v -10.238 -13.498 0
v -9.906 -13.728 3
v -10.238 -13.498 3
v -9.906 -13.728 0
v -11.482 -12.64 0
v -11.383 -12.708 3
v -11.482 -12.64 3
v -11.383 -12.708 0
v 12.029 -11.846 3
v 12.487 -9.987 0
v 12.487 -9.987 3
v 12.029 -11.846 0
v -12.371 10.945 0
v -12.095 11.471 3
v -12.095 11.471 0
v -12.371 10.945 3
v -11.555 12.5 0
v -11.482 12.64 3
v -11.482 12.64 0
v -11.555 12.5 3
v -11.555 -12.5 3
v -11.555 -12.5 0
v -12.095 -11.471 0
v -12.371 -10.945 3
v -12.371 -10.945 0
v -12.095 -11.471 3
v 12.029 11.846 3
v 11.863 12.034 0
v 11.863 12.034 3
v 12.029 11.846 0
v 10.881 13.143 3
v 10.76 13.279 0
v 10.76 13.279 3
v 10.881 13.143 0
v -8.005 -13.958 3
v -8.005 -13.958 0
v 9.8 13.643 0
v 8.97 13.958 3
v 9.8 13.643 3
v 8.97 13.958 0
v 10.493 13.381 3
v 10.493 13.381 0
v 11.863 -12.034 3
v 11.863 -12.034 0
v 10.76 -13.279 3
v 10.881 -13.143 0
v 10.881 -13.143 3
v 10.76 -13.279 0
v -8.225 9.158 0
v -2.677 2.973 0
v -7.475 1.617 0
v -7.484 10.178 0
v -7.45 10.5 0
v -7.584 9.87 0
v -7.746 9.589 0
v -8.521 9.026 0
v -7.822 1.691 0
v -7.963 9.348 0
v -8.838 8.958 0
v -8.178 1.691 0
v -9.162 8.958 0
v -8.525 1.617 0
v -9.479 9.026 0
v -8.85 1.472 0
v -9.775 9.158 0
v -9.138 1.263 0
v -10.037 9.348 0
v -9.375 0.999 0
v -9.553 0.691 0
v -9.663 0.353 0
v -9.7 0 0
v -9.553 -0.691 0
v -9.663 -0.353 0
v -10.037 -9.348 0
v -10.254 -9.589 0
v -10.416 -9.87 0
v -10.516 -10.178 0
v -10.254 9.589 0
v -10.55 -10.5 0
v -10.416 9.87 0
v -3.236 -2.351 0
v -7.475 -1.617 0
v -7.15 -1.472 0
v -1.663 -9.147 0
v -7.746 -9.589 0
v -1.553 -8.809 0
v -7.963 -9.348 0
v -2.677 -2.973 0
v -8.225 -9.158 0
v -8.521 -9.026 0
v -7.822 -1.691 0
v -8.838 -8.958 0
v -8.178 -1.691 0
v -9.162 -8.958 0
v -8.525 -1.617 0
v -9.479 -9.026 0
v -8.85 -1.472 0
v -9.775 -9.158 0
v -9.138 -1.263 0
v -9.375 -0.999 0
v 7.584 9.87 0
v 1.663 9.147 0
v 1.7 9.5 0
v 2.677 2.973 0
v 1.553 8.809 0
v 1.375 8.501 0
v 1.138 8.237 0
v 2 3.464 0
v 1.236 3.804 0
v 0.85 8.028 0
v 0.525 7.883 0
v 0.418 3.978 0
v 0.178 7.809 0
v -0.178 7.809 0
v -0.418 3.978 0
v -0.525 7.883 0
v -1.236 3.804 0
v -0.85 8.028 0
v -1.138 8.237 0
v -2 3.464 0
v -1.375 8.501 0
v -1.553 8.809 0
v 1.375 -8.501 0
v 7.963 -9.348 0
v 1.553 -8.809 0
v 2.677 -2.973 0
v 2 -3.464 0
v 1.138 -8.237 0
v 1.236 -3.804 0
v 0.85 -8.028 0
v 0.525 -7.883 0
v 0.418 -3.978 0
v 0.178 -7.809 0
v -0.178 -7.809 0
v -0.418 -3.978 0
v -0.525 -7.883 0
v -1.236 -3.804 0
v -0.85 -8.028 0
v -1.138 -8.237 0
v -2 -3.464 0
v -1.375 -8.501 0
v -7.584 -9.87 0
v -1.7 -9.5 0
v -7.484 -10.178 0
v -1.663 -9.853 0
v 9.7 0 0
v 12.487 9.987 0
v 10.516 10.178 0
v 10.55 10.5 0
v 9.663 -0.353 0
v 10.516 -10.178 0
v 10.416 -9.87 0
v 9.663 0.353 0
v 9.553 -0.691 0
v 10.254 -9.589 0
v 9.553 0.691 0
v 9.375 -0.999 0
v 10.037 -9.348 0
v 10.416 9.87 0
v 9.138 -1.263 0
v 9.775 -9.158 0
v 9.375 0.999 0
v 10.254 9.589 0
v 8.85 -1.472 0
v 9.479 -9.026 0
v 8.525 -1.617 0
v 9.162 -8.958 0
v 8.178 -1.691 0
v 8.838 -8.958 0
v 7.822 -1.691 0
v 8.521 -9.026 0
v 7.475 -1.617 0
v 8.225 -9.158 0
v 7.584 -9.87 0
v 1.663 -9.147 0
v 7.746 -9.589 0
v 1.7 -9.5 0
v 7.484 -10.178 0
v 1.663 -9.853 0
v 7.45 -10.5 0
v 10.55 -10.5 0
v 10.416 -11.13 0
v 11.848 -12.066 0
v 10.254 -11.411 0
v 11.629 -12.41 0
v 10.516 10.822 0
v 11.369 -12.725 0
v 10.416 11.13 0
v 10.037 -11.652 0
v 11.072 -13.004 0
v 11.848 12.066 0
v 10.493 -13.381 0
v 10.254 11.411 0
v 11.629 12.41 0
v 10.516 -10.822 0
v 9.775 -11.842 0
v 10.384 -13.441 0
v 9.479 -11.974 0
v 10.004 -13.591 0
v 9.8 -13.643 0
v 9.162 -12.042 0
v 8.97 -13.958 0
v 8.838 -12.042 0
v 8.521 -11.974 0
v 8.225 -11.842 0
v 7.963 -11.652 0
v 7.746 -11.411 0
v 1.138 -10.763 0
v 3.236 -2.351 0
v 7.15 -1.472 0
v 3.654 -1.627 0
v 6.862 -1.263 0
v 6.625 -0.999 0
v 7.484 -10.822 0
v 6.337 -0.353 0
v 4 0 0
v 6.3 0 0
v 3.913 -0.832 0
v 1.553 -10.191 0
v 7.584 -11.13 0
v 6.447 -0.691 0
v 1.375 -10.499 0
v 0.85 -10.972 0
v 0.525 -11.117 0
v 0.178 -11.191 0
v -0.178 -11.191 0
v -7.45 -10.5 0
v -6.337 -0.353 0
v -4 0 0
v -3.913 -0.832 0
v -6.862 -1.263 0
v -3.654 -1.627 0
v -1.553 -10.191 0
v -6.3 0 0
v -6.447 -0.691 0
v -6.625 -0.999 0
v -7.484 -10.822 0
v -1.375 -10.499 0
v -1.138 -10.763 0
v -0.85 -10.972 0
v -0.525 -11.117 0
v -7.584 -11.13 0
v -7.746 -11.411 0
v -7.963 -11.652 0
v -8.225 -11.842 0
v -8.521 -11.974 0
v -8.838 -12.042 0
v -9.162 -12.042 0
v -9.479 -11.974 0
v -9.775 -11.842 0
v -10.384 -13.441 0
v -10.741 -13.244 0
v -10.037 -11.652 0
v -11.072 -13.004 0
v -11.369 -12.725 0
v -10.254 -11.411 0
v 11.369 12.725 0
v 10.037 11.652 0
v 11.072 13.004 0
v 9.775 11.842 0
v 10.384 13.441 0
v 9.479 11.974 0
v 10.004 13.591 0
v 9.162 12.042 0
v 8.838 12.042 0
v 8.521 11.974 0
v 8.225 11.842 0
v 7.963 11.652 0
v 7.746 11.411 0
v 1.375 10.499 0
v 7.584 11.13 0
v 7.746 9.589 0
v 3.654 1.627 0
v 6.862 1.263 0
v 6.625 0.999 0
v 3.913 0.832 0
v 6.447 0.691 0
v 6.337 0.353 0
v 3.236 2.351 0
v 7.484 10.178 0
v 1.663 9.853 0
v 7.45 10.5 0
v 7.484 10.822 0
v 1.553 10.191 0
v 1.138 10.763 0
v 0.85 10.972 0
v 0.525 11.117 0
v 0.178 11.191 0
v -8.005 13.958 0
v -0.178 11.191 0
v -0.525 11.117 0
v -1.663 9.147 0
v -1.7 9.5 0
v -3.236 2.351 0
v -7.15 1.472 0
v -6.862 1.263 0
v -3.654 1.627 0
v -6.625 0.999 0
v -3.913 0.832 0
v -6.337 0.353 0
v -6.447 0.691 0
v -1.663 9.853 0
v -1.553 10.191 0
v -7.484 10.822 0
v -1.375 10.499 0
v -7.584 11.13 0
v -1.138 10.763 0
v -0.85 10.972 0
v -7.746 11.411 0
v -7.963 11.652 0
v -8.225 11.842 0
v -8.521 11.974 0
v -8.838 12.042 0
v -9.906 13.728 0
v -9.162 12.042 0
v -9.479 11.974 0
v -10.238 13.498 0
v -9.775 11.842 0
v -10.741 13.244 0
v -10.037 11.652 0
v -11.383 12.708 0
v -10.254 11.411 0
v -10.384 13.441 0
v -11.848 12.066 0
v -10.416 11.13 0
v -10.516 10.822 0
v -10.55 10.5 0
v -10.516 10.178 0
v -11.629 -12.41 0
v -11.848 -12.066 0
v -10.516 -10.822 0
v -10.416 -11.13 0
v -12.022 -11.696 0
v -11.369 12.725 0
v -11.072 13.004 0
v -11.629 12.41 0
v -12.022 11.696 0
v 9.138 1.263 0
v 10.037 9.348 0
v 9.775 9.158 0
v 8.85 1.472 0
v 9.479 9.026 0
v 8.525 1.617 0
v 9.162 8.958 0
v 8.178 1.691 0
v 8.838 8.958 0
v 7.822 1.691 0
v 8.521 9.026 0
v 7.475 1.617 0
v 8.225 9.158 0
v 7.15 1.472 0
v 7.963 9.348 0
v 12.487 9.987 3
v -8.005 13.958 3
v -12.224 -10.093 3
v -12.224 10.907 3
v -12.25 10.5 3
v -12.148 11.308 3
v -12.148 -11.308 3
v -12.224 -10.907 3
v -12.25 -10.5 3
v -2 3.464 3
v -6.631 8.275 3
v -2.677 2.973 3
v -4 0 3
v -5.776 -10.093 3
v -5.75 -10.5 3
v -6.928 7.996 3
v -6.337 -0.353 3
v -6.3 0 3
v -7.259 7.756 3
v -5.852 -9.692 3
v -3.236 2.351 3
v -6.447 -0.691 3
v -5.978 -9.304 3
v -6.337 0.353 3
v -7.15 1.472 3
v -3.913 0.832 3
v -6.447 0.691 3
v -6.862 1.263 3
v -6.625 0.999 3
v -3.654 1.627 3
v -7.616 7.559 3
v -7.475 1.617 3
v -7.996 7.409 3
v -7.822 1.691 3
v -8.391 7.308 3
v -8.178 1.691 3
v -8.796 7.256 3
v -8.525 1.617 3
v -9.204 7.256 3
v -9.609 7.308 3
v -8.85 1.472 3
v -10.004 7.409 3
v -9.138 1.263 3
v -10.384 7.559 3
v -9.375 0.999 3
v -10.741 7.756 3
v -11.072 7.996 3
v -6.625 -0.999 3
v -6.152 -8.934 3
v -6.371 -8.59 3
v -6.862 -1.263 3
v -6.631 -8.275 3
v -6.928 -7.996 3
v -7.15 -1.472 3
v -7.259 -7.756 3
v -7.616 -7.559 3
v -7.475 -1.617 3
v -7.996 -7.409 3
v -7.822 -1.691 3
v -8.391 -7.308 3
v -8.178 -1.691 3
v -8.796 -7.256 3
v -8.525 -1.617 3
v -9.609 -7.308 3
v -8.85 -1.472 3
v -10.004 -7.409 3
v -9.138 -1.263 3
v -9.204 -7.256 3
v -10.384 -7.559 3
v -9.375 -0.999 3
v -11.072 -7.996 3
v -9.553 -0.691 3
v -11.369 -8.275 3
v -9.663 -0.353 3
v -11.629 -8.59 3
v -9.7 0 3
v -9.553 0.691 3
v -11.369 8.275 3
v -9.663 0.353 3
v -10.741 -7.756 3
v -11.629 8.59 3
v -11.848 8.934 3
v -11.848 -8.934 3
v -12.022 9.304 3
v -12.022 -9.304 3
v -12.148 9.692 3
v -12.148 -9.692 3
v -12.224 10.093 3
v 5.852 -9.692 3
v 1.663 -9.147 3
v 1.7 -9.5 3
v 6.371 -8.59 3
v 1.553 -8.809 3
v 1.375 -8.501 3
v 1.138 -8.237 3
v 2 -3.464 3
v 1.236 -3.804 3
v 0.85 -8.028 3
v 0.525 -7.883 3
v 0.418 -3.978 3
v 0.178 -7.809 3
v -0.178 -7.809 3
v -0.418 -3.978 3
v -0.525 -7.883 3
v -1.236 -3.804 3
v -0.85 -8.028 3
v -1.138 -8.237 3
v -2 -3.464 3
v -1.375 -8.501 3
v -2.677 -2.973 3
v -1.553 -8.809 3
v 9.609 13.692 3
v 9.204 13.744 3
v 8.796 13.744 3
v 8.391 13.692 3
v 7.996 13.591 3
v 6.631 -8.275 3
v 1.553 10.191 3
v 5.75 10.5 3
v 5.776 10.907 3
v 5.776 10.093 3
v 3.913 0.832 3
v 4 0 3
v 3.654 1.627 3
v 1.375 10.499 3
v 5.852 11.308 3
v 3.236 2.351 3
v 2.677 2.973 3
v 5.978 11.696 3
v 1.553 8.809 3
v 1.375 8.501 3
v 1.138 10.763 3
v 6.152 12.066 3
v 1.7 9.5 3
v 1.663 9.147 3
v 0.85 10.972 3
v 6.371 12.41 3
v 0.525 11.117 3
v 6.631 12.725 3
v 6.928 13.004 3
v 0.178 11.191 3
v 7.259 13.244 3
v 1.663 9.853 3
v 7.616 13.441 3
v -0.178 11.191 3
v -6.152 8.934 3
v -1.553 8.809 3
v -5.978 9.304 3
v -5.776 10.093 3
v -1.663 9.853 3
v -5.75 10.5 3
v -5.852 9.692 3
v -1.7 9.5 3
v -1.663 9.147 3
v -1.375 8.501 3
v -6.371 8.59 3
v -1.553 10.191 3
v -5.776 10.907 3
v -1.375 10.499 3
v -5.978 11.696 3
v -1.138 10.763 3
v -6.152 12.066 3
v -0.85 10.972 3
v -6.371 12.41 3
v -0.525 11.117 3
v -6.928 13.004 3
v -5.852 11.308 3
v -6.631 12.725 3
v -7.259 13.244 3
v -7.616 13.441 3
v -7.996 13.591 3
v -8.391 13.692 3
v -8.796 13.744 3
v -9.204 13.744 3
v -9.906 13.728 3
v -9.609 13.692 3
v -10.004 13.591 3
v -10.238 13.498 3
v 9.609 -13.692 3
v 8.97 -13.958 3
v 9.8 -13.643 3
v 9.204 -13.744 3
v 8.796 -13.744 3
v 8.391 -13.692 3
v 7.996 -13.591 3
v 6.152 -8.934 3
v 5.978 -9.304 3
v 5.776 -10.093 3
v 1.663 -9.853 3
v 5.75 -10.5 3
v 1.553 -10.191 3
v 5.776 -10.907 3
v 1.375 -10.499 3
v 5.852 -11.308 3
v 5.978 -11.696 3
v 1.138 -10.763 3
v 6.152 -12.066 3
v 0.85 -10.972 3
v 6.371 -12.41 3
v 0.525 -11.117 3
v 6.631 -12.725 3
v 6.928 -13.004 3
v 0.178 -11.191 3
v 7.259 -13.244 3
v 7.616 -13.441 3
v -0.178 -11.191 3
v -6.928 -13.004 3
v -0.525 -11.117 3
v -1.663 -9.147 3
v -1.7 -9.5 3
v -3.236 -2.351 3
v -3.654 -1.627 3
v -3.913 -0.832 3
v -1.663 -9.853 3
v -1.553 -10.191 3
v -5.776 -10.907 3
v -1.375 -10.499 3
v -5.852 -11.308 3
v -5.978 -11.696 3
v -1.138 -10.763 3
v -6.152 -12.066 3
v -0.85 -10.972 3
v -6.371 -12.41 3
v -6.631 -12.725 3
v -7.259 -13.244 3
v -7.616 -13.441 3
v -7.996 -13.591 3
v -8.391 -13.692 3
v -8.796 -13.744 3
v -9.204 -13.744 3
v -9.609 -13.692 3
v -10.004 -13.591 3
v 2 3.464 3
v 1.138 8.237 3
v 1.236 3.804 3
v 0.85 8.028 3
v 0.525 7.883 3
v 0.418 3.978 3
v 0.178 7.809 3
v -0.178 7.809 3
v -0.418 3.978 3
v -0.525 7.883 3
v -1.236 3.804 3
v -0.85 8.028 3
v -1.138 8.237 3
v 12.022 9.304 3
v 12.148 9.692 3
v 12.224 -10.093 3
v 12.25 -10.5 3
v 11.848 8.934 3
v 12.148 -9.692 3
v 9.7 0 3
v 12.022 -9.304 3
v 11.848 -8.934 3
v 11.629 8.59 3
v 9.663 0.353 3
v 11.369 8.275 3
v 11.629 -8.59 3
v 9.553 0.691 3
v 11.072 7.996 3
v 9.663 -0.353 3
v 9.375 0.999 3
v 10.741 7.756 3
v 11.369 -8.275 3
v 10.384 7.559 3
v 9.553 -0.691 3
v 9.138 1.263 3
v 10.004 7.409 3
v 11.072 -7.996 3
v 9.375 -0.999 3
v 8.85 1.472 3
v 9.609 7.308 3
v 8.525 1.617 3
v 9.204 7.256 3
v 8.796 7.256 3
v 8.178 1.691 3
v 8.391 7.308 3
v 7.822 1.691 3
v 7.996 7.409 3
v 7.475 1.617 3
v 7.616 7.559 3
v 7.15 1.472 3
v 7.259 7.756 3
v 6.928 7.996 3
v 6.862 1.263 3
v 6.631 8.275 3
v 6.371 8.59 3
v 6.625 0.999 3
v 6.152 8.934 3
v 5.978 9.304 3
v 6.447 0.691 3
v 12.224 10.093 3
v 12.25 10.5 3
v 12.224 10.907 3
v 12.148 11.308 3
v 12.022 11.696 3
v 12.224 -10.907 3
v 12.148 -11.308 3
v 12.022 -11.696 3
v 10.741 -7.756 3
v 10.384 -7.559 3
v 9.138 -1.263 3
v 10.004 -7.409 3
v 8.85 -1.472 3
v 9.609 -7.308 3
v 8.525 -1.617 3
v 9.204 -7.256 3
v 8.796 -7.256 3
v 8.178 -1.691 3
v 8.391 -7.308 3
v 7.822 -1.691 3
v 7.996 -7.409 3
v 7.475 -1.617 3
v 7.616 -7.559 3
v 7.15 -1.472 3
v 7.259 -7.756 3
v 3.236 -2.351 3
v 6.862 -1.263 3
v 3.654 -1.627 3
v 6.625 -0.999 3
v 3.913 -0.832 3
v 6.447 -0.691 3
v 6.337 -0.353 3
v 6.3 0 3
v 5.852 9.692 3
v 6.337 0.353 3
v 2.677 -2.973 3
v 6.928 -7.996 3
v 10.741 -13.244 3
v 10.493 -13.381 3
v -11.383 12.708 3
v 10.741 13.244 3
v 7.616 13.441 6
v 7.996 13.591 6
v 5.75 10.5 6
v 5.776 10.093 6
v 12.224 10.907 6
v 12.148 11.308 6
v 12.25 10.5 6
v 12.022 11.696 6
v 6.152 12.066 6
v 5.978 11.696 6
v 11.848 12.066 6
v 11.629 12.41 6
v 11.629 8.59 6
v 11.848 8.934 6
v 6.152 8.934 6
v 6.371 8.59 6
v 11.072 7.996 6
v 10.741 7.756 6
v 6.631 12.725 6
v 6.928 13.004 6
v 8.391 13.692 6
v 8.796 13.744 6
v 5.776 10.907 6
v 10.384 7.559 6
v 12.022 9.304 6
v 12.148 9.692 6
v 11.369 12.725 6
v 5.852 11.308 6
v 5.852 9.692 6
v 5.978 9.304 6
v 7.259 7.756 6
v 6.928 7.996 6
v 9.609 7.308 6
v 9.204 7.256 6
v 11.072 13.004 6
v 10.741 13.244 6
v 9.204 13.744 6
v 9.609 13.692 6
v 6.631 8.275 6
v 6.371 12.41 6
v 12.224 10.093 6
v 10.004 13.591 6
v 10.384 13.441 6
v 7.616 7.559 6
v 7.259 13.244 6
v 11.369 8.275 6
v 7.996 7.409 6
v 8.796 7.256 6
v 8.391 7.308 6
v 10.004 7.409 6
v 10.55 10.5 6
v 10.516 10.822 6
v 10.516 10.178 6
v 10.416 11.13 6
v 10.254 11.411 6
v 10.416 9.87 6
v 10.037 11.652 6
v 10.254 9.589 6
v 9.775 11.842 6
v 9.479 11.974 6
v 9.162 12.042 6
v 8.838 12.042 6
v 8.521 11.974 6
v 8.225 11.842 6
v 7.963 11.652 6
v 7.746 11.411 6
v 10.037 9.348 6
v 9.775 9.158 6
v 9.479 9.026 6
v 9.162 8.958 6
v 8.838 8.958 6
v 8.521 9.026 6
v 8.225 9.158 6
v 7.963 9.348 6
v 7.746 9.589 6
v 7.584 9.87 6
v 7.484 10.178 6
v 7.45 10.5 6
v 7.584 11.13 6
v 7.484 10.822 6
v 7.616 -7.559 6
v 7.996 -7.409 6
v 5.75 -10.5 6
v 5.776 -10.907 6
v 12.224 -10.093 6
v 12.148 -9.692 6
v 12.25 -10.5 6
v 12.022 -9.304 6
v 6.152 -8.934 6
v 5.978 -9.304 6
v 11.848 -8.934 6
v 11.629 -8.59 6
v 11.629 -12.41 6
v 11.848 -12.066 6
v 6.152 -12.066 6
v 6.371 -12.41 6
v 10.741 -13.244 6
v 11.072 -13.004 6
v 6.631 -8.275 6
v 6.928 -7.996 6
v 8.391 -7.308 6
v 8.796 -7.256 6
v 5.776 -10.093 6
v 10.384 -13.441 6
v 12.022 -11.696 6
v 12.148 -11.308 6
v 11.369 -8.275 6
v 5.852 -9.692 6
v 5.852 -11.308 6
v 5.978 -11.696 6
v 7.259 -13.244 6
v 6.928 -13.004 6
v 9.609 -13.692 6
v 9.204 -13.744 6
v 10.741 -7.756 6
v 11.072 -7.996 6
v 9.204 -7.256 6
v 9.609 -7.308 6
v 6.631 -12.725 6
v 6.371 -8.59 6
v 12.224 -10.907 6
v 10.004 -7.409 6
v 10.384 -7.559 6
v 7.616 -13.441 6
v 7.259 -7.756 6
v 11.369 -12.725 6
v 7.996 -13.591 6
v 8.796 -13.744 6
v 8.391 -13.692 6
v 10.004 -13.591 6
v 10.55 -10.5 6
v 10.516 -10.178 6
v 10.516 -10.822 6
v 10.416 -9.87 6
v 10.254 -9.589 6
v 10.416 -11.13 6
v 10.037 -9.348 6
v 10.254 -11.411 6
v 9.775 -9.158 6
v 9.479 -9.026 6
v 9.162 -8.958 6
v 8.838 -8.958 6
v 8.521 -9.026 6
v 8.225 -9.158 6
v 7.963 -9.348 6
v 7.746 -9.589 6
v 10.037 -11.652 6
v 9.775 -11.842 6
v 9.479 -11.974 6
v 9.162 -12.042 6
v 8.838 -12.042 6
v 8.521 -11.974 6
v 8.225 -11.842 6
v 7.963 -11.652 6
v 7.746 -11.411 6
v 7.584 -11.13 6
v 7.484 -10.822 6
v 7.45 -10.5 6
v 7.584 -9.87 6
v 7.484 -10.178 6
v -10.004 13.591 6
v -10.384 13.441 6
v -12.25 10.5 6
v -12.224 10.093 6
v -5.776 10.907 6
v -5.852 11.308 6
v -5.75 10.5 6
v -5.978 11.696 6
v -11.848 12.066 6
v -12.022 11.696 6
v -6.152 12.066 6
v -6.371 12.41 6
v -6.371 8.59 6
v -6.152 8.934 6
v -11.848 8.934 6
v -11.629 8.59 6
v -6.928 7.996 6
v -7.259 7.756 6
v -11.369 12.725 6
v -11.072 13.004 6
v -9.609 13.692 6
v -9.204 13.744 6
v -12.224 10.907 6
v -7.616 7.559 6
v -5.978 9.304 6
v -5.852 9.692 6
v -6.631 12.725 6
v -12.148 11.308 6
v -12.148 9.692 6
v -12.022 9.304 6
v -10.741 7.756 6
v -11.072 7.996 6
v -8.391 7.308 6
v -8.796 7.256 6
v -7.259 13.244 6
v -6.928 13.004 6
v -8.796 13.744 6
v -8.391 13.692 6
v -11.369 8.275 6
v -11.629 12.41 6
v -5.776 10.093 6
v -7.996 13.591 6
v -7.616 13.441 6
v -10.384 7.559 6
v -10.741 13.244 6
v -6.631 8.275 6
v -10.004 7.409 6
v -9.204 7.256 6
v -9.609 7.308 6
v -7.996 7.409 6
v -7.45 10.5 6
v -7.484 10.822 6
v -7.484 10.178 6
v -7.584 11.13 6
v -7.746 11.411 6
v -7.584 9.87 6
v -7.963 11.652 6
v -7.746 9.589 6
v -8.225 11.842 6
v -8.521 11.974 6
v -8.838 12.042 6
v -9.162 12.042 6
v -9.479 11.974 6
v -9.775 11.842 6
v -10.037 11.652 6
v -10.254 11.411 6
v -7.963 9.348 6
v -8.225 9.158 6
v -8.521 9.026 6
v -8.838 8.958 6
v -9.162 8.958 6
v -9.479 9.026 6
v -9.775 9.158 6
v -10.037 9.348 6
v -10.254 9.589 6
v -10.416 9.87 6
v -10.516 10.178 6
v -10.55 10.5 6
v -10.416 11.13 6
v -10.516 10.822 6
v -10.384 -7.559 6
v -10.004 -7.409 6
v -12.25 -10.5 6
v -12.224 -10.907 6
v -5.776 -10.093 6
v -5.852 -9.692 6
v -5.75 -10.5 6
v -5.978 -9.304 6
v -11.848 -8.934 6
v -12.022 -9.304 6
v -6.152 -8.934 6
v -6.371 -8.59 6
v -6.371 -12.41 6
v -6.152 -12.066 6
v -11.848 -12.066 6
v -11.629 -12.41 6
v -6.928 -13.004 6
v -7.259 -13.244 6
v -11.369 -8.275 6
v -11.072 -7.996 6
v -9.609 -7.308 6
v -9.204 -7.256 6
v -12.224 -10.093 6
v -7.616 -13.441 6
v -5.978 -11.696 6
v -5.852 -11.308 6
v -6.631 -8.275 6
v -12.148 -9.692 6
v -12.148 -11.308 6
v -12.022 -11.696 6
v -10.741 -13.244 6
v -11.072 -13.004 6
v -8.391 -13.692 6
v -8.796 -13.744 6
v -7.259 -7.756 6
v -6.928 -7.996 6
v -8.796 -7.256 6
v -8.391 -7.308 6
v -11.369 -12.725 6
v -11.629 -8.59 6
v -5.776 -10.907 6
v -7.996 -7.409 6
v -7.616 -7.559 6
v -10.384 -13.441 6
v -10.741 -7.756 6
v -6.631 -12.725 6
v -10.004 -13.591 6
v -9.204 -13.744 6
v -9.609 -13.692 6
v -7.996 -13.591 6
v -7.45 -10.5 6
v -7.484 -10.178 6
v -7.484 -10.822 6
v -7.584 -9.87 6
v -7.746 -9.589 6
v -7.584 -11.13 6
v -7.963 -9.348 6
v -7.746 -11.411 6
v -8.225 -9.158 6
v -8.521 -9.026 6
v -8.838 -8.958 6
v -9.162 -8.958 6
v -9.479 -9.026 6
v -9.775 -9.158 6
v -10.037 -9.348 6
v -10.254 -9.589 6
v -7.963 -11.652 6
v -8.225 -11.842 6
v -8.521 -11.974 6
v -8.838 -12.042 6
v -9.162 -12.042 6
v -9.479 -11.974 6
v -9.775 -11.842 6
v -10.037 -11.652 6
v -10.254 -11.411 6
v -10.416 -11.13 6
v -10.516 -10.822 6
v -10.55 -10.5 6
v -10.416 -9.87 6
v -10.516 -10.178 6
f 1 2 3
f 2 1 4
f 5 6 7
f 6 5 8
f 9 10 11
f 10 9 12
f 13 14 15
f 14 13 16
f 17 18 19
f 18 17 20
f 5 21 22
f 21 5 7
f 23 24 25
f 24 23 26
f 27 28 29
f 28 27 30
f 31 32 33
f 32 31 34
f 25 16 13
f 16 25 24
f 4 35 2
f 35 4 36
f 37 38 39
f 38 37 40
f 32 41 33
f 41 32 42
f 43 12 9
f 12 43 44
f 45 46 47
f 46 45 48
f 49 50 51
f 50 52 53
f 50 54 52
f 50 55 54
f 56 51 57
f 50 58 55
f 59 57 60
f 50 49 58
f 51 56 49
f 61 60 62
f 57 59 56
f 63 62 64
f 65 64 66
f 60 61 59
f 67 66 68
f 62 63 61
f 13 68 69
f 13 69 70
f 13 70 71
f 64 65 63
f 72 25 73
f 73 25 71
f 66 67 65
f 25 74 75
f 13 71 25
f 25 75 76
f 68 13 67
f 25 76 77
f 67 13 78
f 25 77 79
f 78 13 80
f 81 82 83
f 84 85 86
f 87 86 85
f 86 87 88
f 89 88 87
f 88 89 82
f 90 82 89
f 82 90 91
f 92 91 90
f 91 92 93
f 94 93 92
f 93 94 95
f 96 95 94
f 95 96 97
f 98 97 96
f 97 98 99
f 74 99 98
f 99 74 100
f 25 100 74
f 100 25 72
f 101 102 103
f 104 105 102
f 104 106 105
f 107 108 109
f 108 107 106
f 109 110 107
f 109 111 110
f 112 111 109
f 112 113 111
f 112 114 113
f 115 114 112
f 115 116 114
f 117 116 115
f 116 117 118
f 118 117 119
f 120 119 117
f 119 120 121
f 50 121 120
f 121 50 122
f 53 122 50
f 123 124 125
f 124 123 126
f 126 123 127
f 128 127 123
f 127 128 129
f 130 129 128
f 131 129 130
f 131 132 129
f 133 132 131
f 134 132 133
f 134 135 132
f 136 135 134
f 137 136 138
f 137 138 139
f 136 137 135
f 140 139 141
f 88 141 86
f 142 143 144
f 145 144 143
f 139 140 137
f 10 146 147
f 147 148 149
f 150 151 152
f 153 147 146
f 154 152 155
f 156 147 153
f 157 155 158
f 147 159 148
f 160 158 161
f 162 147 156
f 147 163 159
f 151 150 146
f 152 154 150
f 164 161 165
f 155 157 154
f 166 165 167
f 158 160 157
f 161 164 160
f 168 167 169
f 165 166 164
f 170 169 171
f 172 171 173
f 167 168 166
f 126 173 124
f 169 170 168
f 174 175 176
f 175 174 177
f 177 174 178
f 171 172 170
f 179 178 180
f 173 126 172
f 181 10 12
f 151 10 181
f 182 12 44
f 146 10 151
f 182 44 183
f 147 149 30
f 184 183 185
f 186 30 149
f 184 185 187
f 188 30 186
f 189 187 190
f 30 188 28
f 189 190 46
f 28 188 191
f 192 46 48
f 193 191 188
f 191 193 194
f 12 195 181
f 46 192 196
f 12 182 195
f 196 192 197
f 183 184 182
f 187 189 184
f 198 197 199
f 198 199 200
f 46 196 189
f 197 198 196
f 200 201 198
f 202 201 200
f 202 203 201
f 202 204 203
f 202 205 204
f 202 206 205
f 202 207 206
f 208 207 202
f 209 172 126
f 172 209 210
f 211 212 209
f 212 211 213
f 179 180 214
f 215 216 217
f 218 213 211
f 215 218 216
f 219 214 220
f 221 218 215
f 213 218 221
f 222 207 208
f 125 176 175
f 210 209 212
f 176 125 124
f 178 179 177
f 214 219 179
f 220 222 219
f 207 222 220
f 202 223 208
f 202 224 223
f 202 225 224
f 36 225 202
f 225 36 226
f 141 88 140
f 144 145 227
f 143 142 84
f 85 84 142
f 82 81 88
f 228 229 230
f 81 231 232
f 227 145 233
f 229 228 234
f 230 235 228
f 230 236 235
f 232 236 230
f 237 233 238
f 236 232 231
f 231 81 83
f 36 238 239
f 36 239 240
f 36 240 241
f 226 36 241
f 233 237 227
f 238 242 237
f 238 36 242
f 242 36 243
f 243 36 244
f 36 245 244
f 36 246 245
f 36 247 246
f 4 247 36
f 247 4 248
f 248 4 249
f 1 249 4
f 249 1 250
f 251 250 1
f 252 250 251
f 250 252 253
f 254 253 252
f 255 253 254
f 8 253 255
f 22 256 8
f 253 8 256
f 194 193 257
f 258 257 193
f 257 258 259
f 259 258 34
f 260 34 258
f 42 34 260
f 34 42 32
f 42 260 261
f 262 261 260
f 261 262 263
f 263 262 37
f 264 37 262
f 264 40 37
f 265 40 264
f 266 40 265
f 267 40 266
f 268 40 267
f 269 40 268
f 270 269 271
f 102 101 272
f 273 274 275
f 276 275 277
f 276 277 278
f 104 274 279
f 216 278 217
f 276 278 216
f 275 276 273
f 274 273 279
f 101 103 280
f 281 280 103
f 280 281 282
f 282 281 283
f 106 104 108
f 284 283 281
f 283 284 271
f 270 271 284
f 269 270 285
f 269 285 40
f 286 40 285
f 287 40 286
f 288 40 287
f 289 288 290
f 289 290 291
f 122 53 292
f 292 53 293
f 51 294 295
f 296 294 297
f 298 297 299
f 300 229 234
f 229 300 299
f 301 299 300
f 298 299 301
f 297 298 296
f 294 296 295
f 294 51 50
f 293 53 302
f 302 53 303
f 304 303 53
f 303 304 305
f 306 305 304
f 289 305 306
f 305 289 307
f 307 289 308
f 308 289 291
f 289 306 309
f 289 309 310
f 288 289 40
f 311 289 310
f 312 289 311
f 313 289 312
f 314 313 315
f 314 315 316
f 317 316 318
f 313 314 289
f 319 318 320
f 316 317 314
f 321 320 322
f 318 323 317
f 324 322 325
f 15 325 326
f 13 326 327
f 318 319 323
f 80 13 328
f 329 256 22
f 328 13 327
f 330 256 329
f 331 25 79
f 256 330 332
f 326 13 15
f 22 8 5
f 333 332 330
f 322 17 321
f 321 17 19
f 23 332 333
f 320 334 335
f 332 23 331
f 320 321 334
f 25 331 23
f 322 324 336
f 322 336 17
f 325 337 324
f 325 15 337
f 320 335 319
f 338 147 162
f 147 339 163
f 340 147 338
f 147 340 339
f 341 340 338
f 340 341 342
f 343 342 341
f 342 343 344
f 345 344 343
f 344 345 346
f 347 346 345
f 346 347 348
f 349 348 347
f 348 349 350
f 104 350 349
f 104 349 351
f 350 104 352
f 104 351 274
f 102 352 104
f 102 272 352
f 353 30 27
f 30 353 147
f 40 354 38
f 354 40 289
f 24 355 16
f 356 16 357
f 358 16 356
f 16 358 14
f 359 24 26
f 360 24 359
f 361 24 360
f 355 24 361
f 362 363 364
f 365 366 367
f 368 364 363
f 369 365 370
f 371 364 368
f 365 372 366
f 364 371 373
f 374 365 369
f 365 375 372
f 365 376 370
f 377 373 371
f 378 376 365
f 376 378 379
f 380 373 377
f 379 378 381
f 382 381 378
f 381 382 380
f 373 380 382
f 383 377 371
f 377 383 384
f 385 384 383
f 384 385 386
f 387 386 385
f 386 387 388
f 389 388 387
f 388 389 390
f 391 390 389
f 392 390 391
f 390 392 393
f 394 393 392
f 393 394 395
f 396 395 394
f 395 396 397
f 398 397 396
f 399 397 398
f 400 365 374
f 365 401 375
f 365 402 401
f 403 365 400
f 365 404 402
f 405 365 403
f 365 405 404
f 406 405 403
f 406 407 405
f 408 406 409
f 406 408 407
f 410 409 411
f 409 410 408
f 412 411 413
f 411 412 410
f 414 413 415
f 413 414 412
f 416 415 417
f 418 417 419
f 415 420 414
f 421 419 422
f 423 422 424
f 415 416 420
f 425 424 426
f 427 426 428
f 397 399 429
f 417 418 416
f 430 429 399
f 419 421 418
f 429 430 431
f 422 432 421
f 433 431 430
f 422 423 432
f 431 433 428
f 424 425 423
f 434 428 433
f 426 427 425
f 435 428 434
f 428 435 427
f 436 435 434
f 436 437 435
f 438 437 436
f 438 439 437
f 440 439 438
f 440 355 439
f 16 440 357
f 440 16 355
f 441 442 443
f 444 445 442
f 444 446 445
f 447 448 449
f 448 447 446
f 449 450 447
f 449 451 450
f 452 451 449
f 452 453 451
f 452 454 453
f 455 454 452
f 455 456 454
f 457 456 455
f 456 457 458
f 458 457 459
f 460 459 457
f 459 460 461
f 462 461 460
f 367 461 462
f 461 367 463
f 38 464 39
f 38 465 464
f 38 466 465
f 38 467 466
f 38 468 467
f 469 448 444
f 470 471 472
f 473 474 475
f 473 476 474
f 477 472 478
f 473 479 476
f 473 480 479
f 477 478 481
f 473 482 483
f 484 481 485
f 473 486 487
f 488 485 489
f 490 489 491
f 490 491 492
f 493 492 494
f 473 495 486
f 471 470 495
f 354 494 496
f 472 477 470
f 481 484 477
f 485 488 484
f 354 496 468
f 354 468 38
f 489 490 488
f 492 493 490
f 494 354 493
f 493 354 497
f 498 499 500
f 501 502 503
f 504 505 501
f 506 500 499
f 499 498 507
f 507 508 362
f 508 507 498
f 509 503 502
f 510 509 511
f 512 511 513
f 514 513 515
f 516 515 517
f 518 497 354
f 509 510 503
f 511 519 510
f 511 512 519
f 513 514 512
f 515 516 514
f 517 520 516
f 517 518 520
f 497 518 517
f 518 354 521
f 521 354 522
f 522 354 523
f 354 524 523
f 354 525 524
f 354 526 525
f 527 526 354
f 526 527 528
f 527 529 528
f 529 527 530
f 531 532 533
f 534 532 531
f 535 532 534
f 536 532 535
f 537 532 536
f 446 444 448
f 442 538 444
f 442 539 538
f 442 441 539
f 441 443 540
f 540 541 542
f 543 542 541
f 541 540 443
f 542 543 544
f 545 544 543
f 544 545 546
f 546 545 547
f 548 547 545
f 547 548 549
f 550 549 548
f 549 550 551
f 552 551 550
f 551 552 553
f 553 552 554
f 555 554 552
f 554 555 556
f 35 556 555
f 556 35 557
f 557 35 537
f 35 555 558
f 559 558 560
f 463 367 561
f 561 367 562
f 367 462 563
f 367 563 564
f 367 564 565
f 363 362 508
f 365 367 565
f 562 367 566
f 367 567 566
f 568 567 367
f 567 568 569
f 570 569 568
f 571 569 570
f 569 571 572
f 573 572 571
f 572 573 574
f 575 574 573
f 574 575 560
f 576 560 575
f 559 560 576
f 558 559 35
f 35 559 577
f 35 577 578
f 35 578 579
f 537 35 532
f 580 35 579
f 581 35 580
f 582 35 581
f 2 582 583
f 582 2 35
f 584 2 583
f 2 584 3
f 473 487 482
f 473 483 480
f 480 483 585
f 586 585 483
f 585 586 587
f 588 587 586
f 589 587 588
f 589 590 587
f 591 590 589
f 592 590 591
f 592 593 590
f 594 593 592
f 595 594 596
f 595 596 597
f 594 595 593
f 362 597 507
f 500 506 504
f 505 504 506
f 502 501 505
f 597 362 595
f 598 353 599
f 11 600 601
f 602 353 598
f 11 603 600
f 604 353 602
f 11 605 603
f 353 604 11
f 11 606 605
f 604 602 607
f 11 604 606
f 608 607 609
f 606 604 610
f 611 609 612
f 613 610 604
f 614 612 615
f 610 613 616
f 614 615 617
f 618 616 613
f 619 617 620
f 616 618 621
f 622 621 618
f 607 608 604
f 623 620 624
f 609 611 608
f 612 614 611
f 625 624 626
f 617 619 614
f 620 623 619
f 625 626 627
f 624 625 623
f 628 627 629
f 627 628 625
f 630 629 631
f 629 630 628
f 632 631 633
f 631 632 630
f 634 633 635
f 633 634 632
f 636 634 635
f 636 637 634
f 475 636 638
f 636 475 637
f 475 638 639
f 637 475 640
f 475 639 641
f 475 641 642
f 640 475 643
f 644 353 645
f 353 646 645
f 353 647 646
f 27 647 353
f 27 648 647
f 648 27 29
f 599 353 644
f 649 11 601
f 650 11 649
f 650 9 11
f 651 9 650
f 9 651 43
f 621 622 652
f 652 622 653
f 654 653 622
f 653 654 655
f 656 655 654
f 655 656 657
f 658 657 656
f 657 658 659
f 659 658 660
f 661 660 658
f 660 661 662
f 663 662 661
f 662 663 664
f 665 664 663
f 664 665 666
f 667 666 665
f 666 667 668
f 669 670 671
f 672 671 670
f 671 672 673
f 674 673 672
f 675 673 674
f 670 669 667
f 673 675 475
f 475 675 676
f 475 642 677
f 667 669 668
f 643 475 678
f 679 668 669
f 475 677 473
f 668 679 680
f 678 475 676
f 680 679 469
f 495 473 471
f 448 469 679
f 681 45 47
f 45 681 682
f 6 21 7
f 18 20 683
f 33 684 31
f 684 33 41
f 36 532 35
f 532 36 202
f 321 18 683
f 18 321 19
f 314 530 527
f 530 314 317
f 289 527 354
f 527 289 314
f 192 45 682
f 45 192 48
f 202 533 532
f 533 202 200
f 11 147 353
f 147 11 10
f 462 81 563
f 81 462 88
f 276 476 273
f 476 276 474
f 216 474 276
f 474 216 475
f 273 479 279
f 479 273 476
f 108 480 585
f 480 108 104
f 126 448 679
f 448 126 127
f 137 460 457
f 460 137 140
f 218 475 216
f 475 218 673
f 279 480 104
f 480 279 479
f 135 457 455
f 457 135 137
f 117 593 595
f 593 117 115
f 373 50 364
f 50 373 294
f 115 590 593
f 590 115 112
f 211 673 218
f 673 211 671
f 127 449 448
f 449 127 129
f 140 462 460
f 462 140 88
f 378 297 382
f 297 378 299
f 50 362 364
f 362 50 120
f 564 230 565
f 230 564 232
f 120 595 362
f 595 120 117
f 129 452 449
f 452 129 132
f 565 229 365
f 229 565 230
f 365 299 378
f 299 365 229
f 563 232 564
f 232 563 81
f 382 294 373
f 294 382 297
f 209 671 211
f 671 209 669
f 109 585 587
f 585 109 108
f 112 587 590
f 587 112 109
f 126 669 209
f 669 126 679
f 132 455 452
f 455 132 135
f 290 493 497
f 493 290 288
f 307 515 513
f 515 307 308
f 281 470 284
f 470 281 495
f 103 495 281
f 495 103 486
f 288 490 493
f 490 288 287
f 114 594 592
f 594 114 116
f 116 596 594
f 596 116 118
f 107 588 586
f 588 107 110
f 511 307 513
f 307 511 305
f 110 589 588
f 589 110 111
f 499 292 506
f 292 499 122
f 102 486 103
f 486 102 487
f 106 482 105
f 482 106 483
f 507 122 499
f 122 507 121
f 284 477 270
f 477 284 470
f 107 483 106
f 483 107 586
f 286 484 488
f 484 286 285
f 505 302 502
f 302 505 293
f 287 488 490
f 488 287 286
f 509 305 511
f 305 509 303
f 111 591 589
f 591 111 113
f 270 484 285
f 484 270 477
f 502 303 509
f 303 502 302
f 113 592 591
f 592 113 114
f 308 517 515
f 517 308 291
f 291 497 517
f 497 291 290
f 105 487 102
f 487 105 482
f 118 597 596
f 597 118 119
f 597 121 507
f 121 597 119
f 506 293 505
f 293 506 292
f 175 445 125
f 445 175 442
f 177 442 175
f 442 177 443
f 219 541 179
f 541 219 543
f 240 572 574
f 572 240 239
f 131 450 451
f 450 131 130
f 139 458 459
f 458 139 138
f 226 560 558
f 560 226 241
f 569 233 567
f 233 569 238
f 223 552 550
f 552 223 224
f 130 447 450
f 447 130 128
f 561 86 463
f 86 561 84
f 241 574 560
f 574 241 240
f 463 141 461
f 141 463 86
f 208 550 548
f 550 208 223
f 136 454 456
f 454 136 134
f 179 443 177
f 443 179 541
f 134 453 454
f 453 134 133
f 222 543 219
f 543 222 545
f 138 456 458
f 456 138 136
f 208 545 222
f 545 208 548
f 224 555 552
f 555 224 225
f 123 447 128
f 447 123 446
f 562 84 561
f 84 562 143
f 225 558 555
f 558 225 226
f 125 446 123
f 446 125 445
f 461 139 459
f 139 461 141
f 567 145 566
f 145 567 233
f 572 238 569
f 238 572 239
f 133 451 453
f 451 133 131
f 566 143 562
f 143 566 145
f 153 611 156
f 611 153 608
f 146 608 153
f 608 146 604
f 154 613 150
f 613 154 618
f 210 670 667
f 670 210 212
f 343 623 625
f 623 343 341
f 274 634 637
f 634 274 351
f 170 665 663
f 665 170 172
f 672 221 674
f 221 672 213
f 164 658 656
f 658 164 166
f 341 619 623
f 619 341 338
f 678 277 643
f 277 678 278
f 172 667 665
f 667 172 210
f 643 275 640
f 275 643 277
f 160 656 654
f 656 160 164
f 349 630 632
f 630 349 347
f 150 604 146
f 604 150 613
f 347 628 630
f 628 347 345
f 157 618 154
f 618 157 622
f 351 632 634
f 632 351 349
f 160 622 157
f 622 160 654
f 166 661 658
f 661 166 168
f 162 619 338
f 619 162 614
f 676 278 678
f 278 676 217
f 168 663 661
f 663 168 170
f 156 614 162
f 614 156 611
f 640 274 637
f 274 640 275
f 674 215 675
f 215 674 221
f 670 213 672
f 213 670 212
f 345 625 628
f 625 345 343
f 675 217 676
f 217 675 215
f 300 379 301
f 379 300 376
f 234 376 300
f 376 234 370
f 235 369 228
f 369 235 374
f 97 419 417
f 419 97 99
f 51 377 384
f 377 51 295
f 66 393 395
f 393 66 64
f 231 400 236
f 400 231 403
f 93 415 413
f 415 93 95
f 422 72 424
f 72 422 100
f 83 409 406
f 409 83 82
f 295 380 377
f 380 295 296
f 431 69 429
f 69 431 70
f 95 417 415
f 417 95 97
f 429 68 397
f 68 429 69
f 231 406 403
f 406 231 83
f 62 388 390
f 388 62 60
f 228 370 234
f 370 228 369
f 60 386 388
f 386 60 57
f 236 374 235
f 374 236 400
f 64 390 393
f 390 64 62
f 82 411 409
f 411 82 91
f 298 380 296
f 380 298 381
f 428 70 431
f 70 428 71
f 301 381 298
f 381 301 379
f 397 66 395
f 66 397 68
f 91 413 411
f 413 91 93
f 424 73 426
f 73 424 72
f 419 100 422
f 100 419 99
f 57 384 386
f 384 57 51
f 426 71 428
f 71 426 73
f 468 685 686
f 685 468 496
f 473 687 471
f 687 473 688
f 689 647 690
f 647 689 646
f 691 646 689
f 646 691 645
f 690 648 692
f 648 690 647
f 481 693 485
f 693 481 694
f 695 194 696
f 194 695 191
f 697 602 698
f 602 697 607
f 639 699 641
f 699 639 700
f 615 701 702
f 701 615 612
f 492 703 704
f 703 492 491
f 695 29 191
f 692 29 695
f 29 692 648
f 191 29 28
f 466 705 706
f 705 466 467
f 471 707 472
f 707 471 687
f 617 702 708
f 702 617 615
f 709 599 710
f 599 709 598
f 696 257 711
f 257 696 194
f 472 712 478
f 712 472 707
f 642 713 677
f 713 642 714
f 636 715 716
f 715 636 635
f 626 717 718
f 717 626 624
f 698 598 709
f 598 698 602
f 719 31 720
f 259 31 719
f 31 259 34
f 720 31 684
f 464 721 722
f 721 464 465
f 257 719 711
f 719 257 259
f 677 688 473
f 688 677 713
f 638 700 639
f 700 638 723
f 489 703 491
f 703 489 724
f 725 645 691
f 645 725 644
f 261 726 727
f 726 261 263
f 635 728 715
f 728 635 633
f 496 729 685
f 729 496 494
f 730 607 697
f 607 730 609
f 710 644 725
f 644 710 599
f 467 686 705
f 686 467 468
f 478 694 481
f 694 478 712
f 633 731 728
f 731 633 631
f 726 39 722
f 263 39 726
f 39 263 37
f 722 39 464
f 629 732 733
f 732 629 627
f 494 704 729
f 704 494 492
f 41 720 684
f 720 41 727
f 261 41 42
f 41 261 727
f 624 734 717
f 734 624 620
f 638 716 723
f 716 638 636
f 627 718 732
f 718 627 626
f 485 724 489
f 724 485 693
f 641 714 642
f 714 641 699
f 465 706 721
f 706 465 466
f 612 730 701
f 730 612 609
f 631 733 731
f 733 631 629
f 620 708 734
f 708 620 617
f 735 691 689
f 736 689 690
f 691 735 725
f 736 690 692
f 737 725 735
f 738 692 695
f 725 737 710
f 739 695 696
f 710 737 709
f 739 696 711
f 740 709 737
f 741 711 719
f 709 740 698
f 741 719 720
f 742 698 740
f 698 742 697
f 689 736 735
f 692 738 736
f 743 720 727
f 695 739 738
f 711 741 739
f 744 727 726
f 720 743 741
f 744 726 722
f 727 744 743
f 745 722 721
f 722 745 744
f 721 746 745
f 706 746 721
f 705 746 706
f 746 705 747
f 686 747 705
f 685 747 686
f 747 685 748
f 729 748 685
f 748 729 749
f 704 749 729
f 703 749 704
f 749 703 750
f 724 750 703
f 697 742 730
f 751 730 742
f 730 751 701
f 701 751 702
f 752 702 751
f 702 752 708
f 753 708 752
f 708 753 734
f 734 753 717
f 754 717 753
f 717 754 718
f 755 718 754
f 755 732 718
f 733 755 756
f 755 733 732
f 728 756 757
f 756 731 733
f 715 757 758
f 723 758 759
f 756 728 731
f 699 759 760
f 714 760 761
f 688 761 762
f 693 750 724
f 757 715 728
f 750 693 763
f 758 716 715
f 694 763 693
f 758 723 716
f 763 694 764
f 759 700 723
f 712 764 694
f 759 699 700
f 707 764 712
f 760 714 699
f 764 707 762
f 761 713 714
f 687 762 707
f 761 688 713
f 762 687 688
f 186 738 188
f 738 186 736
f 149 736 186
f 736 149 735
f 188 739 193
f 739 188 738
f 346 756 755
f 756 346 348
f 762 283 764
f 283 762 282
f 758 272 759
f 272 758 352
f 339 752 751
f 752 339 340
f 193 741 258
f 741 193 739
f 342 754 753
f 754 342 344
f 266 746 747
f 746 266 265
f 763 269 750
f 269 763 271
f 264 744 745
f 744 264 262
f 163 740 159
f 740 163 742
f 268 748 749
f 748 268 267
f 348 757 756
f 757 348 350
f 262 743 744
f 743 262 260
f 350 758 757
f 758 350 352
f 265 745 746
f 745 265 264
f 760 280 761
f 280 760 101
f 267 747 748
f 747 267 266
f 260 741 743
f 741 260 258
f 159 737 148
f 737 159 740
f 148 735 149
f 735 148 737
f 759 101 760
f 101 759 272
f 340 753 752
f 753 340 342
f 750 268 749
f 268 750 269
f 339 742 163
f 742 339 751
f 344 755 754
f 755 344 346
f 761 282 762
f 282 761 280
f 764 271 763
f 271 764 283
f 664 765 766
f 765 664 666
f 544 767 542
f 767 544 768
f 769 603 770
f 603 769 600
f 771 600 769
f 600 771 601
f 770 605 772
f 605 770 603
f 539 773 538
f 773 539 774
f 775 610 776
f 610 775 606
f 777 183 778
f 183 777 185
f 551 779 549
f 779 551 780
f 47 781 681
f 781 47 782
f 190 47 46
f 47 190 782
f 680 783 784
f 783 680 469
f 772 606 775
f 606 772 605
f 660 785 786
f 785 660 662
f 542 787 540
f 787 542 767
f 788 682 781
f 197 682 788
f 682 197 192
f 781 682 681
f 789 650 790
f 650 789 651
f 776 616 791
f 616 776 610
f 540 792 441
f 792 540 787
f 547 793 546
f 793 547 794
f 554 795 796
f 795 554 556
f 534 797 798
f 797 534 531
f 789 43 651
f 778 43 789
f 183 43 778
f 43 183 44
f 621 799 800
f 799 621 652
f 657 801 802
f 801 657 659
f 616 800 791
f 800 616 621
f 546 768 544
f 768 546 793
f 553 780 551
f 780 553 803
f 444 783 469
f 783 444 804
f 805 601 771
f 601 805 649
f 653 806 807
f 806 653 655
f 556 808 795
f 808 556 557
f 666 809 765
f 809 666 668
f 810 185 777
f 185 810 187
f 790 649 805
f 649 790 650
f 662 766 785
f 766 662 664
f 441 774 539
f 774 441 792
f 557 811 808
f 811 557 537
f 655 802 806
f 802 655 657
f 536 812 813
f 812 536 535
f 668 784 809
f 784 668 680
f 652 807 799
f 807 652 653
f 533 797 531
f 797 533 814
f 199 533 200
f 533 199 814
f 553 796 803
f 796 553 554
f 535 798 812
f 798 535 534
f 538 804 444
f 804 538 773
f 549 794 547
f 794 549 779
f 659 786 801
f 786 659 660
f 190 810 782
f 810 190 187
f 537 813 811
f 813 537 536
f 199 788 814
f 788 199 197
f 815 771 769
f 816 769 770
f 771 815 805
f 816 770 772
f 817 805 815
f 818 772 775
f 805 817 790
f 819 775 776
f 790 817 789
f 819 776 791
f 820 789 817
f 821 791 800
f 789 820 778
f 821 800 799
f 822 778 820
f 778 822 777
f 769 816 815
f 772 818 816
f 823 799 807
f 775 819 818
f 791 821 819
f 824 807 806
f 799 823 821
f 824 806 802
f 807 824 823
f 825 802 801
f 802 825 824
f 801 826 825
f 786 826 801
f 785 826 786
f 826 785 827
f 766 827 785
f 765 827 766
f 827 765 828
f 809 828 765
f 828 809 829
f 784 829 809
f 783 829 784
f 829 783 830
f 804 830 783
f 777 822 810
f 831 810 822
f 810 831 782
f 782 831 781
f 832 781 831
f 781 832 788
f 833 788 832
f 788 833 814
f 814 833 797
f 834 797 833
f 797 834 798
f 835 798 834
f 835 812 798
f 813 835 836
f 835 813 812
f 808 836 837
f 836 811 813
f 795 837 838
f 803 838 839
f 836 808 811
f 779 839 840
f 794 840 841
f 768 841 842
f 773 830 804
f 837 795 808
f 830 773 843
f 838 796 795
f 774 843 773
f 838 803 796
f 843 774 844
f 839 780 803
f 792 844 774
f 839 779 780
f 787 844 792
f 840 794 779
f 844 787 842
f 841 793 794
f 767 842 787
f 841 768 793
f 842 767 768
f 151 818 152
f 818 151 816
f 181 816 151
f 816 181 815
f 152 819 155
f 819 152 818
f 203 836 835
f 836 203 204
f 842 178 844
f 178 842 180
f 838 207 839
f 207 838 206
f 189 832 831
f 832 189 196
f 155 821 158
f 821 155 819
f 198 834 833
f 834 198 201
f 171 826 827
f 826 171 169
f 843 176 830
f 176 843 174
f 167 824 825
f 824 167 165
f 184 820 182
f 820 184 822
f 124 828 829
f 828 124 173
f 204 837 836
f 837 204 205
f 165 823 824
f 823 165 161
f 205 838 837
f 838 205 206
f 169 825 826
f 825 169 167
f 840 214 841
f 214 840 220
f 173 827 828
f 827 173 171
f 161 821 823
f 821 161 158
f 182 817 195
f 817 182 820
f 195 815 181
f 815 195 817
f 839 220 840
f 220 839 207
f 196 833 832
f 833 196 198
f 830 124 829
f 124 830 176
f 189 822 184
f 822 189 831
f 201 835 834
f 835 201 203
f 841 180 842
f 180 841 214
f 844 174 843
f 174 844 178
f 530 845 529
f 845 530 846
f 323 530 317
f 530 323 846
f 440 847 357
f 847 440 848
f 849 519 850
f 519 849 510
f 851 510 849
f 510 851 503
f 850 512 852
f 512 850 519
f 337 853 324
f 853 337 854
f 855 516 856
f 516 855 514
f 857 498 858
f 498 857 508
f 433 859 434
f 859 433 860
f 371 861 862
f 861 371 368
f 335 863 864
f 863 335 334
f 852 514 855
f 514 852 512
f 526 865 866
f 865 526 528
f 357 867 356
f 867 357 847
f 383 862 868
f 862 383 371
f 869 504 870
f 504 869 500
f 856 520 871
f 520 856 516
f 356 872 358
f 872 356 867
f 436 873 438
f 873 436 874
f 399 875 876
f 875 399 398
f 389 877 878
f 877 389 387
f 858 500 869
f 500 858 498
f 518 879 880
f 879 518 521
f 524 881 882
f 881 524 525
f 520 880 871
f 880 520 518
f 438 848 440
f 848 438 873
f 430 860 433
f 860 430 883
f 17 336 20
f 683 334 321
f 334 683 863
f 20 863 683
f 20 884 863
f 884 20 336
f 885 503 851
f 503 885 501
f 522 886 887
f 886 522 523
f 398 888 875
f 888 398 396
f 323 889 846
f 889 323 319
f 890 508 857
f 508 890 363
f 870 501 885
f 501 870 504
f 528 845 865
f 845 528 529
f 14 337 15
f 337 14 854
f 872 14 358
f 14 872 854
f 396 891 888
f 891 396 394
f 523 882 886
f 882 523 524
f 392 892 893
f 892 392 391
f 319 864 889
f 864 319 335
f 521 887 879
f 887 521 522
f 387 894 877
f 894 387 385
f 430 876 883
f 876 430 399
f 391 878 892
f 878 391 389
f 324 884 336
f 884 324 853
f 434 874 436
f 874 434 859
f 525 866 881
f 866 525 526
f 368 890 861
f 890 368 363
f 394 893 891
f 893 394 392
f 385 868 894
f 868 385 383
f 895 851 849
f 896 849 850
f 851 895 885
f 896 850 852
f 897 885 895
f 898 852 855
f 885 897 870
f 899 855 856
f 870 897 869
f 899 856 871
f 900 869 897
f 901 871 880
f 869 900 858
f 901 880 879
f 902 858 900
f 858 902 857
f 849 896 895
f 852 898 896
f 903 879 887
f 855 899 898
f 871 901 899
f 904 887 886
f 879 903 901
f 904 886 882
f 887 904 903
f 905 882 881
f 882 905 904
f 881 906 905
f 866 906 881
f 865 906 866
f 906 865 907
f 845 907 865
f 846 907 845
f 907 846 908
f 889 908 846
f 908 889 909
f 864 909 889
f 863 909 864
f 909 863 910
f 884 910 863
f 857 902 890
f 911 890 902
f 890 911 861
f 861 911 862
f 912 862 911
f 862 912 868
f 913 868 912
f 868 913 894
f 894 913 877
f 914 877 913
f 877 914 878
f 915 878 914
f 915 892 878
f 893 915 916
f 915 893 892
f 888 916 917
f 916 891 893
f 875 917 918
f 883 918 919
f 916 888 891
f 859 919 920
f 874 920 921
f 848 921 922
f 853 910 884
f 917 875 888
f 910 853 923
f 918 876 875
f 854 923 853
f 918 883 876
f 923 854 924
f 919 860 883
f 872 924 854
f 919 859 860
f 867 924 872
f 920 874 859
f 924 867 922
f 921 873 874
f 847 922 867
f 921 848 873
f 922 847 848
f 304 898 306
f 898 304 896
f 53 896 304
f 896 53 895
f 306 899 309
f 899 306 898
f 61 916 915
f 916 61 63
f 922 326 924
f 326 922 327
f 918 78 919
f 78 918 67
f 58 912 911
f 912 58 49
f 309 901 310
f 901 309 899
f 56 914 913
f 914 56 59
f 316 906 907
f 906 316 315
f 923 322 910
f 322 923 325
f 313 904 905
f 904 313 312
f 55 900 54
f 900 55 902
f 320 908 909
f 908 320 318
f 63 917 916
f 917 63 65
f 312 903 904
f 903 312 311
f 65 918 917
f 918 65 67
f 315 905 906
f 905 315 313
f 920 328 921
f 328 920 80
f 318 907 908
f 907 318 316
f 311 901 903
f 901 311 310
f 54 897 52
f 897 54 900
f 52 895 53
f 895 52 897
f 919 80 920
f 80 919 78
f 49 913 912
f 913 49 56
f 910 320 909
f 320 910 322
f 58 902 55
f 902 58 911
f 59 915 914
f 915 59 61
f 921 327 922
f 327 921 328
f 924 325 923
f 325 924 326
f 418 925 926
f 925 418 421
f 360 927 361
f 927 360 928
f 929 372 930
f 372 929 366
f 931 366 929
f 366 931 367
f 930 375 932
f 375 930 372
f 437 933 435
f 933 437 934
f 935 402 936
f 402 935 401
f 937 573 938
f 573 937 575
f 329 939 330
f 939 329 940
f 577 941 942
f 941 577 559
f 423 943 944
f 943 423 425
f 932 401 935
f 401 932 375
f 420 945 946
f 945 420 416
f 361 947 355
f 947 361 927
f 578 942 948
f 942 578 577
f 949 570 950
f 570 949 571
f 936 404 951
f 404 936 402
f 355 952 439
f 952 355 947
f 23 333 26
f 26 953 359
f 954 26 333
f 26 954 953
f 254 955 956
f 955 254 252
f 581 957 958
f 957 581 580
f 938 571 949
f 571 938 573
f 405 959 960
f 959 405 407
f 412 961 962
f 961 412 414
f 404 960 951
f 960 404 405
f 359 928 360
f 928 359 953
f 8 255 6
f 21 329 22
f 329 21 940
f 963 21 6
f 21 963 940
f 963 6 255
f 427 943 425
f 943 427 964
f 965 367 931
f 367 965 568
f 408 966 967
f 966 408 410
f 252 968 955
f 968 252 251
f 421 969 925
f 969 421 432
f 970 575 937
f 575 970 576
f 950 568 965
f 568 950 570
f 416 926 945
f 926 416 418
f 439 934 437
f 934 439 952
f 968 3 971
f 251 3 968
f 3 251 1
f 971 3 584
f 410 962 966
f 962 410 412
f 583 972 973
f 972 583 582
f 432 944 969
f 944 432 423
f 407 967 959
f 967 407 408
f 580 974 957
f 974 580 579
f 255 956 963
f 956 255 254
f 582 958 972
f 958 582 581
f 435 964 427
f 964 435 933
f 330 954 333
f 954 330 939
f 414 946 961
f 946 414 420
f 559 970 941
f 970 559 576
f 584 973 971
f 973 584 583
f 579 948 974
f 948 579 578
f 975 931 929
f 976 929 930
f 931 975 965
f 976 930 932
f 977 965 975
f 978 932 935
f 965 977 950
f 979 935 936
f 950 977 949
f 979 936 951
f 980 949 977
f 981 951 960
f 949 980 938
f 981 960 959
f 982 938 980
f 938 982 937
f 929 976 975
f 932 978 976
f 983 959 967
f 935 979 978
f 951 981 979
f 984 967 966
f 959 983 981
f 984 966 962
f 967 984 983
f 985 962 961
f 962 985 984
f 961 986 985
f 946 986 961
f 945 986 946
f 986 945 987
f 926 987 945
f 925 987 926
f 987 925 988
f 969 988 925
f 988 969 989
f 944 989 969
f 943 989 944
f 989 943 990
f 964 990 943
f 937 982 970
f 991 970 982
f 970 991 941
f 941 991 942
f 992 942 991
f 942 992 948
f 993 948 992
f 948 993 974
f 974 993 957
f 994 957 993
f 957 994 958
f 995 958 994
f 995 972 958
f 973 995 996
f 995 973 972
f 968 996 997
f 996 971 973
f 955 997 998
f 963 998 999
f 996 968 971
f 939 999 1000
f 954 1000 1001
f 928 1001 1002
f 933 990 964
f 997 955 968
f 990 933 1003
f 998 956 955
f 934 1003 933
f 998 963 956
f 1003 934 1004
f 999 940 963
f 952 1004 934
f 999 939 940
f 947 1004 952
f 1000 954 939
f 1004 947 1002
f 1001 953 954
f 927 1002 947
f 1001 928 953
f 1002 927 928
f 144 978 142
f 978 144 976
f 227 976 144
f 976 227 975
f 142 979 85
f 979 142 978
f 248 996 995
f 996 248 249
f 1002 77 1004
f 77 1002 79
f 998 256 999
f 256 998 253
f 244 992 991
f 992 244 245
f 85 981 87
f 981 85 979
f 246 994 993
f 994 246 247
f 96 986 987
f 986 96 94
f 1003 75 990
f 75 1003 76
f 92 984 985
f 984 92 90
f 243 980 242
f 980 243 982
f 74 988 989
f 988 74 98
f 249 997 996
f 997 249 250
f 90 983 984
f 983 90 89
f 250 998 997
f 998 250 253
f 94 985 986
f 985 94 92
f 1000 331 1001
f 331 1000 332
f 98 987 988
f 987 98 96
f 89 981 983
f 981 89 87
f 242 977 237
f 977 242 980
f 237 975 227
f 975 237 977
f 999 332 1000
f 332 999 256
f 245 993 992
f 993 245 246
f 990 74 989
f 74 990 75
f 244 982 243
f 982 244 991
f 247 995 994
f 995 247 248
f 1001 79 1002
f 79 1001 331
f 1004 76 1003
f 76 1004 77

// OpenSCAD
// file: dronePlates.scad
/**
 * dronePlates.scad
 * Plate library
 *
 * GNU GPL V3
 * @author: Victor Potenciano
 */

m3Rad = 3.4/2;
cornerR = 4;

/**
 *
 */
module helperDisk(diameter) {
	cylinder(r = diameter/2, h = 0.6, $fn=20);
}

/**
 *
 */
module roundedRect(size, radius) {
	x = size[0];
	y = size[1];
	z = size[2];

	linear_extrude(height=z)
	hull() {
	// place 4 circles in the corners, with the given radius
	translate([(-x/2)+(radius/2), (-y/2)+(radius/2), 0]){ circle(r=radius); }
	translate([(x/2)-(radius/2), (-y/2)+(radius/2), 0]){ circle(r=radius); }
	translate([(-x/2)+(radius/2), (y/2)-(radius/2), 0]){ circle(r=radius); }
	translate([(x/2)-(radius/2), (y/2)-(radius/2), 0]){ circle(r=radius); }
	}
}

/**
 * rounded rectangle triangle with corner at origin
 */
module roundedTriangle(size, radius) {
	x = size[0];
	y = size[1];
	z = size[2];

	linear_extrude(height=z)
	hull() {
	translate([radius, radius, 0]){ circle(r=radius); }
	translate([x-radius, radius, 0]){ circle(r=radius); }
	translate([radius, y-radius, 0]){ circle(r=radius); }
	}
}

/**
 *
 */
module roundRectPlate(w, l, plateThick=3) {
	difference(){
		roundedRect([l+m3Rad*1.75,w+m3Rad*1.75,plateThick], cornerR);
		translate([l/2, w/2, -0.5]) { cylinder(h = plateThick+1, r = m3Rad, $fn=30); }
		translate([-l/2, w/2, -0.5]) { cylinder(h = plateThick+1, r = m3Rad, $fn=30); }
		translate([l/2, -w/2, -0.5]) { cylinder(h = plateThick+1, r = m3Rad, $fn=30); }
		translate([-l/2, -w/2, -0.5]) { cylinder(h = plateThick+1, r = m3Rad, $fn=30); }
	}
}

/**
 *
 */
module crossSquarePlate(l, thick=3) {
	inDist = cornerR*2+4;
	trianL = sqrt((l*l)/2)-inDist;
	centerR = 4;

	difference(){
		roundRectPlate(l, l, thick);
		translate([0, centerR, -0.5]) { 
			rotate([0,0,45]){ roundedTriangle([trianL,trianL,thick+1], cornerR-2); }
		}
		translate([0, -centerR, -0.5]) { 
			rotate([0,0,225]){ roundedTriangle([trianL,trianL,thick+1], cornerR-2); }
		}
		translate([-centerR, 0, -0.5]) { 
			rotate([0,0,135]){ roundedTriangle([trianL,trianL,thick+1], cornerR-2); }
		}
		translate([centerR, 0, -0.5]) { 
			rotate([0,0,-45]){ roundedTriangle([trianL,trianL,thick+1], cornerR-2); }
		}
	}
}

/**
 *
 */
module hShapePlate(w, l, thick=4) {
	inDist = cornerR*2+1;

	difference(){
		roundRectPlate(w, l, thick);
		translate([0, w/4, -0.5]) { roundedRect([l-inDist,w/2-inDist,thick+1], cornerR-2); }
		translate([0, -w/4, -0.5]) { roundedRect([l-inDist,w/2-inDist,thick+1], cornerR-2); }
	}
}

/**
 *
 */
module motorCircleMount(inDia, outDia, thick=3, extraH=false, d1=19, d2=16, holeR=m3Rad ) {
	difference(){
		cylinder(h = thick, r = outDia/2, $fn=30);
		motorCircleMountHoles(inDia, outDia, thick, extraH, d1=d1, d2=d2, holeR=holeR);
	}
}

/**
 *
 */
module motorCircleMountHoles(inDia, outDia, thick=3, extraH=false, d1=19, d2=16, d3=25, holeR=m3Rad) {
	translate([0, 0, -0.5]) { cylinder(h = thick+1, r = inDia/2, $fn=30); }

	for(i=[0:3]) {
		rotate([0,0,90*i]){
		translate([d1/2, 0, -0.5]) cylinder(h = thick+1, r = holeR, $fn=20);
		translate([d2/2, 0, -0.5]) cylinder(h = thick+1, r = holeR, $fn=20);
		translate([d2/2, -holeR, -0.5]) cube(size = [(d1-d2)/2,holeR*2,thick+1]);
		}
	}
	
	if(extraH==true){	
		for(i=[-1,1]) translate([i*d3/2, 0, -0.5]) { cylinder(h = thick+1, r = holeR, $fn=30); }
	}
}

/**
 *
 */
module motorRectMount(w, l, inDia, thick=3) {
	d1=19;
	d2=16;

	difference(){
		roundRectPlate(w, l, thick);
		translate([0, 0, -0.5]) { cylinder(h = thick+1, r = inDia/2, $fn=30); }
		translate([0, d1/2, -0.5]) { cylinder(h = thick+1, r = m3Rad, $fn=30); }
		translate([0, -d1/2, -0.5]) { cylinder(h = thick+1, r = m3Rad, $fn=30); }
		translate([d2/2, 0, -0.5]) { cylinder(h = thick+1, r = m3Rad, $fn=30); }
		translate([-d2/2, 0, -0.5]) { cylinder(h = thick+1, r = m3Rad, $fn=30); }
	}
}

/**
 *
 */
module tube(inDia, outDia, height) {
	difference(){
		cylinder(h = height, r = outDia/2, $fn=50);
		translate([0, 0, -0.5]) { cylinder(h = height+1, r = inDia/2, $fn=30); }
	}
}

/**
 *
 */
module squareTube(inDia, outDia, height) {
	translate([0,0,height/2]){
	difference(){
		cube(size = [outDia,outDia,height], center = true);
		cube(size = [inDia,inDia,height+1], center = true);
	}
	}
}

/**
 *
 */
module djiFlamewheelHoles(height) {
	a = 23;
	b = 16;
	c = 19.5;
	
	translate([a/2, c/2, 0]) { cylinder(h = height, r = m3Rad, $fn=30); }
	translate([-a/2, c/2, 0]) { cylinder(h = height, r = m3Rad, $fn=30); }
	translate([b/2, -c/2, 0]) { cylinder(h = height, r = m3Rad, $fn=30); }
	translate([-b/2, -c/2, 0]) { cylinder(h = height, r = m3Rad, $fn=30); }
}

/**
 *
 */
module djiFlamewheelHolesBotton(height) {
	a1 = 21;
	c = 19.5;
	
	translate([a1/2, c/2, 0]) { cylinder(h = height, r = m3Rad, $fn=30); }
	translate([-a1/2, c/2, 0]) { cylinder(h = height, r = m3Rad, $fn=30); }
}

/**
 *
 */
module propeller(size){
union(){
difference(){
	cylinder(h = 3, r = size/2, center=true, $fn=30);
	cylinder(h = 3.1, r = size/2-2, center=true, $fn=30); 
}
for( i = [-1,1] ){
rotate([0,0,45*i]){ cube(size = [size,4,1], center = true); }
}
}
}

/**
 *
 */
module slot(length, height, rad){
for(i=[-1,1]) translate([i*length/2,0,0]) cylinder(h = height, r = rad, $fn=30);
translate([0,0,height/2]) cube(size = [length,rad*2,height], center = true);
}

 

////////////////////////
// Examples:
////////////////////////

motorCircleMount(8, 25, 3.5);

//roundedRect([50,50,3], 4);

//hShapePlate(79, 25);

//rotate([0,0,45]){roundedTriangle([40,40,3], 4);}

//crossSquarePlate(45, 4);

/*
union(){
motorRectMount(21, 18, 8, 4);
translate([9, 10.5, 0]) {tube(m3Rad*2, 6.5, 6);}
}
*/

/*
difference(){
union(){
hShapePlate(50, 30, 3.5);
translate([-4,-25,0]){cube(size = [8,50,3.5]);}
rotate([0, 0, 45]) {motorCircleMount(8, 35, 3.5);}
}
cylinder(h = 10, r = 4, $fn=100, center=true);
}
*/

//rotate([90,0,0]){ tube(5,10,20); }
//translate([20,0,0]){ squareTube(5, 10, 20); }
// main file
/**
 * BL tricopter tail motor mount
 *
 */

use <dronePlates.scad>

m3Rad = 3.1/2;
plateThick = 3;

union(){
motorRectMount(21, 18, 8);
translate([9, 10.5, 0]) {tube(m3Rad*2, 6.5, 6);}
translate([9, -10.5, 0]) {tube(m3Rad*2, 6.5, 6);}
translate([-9, 10.5, 0]) {tube(m3Rad*2, 6.5, 6);}
translate([-9, -10.5, 0]) {tube(m3Rad*2, 6.5, 6);}
}
